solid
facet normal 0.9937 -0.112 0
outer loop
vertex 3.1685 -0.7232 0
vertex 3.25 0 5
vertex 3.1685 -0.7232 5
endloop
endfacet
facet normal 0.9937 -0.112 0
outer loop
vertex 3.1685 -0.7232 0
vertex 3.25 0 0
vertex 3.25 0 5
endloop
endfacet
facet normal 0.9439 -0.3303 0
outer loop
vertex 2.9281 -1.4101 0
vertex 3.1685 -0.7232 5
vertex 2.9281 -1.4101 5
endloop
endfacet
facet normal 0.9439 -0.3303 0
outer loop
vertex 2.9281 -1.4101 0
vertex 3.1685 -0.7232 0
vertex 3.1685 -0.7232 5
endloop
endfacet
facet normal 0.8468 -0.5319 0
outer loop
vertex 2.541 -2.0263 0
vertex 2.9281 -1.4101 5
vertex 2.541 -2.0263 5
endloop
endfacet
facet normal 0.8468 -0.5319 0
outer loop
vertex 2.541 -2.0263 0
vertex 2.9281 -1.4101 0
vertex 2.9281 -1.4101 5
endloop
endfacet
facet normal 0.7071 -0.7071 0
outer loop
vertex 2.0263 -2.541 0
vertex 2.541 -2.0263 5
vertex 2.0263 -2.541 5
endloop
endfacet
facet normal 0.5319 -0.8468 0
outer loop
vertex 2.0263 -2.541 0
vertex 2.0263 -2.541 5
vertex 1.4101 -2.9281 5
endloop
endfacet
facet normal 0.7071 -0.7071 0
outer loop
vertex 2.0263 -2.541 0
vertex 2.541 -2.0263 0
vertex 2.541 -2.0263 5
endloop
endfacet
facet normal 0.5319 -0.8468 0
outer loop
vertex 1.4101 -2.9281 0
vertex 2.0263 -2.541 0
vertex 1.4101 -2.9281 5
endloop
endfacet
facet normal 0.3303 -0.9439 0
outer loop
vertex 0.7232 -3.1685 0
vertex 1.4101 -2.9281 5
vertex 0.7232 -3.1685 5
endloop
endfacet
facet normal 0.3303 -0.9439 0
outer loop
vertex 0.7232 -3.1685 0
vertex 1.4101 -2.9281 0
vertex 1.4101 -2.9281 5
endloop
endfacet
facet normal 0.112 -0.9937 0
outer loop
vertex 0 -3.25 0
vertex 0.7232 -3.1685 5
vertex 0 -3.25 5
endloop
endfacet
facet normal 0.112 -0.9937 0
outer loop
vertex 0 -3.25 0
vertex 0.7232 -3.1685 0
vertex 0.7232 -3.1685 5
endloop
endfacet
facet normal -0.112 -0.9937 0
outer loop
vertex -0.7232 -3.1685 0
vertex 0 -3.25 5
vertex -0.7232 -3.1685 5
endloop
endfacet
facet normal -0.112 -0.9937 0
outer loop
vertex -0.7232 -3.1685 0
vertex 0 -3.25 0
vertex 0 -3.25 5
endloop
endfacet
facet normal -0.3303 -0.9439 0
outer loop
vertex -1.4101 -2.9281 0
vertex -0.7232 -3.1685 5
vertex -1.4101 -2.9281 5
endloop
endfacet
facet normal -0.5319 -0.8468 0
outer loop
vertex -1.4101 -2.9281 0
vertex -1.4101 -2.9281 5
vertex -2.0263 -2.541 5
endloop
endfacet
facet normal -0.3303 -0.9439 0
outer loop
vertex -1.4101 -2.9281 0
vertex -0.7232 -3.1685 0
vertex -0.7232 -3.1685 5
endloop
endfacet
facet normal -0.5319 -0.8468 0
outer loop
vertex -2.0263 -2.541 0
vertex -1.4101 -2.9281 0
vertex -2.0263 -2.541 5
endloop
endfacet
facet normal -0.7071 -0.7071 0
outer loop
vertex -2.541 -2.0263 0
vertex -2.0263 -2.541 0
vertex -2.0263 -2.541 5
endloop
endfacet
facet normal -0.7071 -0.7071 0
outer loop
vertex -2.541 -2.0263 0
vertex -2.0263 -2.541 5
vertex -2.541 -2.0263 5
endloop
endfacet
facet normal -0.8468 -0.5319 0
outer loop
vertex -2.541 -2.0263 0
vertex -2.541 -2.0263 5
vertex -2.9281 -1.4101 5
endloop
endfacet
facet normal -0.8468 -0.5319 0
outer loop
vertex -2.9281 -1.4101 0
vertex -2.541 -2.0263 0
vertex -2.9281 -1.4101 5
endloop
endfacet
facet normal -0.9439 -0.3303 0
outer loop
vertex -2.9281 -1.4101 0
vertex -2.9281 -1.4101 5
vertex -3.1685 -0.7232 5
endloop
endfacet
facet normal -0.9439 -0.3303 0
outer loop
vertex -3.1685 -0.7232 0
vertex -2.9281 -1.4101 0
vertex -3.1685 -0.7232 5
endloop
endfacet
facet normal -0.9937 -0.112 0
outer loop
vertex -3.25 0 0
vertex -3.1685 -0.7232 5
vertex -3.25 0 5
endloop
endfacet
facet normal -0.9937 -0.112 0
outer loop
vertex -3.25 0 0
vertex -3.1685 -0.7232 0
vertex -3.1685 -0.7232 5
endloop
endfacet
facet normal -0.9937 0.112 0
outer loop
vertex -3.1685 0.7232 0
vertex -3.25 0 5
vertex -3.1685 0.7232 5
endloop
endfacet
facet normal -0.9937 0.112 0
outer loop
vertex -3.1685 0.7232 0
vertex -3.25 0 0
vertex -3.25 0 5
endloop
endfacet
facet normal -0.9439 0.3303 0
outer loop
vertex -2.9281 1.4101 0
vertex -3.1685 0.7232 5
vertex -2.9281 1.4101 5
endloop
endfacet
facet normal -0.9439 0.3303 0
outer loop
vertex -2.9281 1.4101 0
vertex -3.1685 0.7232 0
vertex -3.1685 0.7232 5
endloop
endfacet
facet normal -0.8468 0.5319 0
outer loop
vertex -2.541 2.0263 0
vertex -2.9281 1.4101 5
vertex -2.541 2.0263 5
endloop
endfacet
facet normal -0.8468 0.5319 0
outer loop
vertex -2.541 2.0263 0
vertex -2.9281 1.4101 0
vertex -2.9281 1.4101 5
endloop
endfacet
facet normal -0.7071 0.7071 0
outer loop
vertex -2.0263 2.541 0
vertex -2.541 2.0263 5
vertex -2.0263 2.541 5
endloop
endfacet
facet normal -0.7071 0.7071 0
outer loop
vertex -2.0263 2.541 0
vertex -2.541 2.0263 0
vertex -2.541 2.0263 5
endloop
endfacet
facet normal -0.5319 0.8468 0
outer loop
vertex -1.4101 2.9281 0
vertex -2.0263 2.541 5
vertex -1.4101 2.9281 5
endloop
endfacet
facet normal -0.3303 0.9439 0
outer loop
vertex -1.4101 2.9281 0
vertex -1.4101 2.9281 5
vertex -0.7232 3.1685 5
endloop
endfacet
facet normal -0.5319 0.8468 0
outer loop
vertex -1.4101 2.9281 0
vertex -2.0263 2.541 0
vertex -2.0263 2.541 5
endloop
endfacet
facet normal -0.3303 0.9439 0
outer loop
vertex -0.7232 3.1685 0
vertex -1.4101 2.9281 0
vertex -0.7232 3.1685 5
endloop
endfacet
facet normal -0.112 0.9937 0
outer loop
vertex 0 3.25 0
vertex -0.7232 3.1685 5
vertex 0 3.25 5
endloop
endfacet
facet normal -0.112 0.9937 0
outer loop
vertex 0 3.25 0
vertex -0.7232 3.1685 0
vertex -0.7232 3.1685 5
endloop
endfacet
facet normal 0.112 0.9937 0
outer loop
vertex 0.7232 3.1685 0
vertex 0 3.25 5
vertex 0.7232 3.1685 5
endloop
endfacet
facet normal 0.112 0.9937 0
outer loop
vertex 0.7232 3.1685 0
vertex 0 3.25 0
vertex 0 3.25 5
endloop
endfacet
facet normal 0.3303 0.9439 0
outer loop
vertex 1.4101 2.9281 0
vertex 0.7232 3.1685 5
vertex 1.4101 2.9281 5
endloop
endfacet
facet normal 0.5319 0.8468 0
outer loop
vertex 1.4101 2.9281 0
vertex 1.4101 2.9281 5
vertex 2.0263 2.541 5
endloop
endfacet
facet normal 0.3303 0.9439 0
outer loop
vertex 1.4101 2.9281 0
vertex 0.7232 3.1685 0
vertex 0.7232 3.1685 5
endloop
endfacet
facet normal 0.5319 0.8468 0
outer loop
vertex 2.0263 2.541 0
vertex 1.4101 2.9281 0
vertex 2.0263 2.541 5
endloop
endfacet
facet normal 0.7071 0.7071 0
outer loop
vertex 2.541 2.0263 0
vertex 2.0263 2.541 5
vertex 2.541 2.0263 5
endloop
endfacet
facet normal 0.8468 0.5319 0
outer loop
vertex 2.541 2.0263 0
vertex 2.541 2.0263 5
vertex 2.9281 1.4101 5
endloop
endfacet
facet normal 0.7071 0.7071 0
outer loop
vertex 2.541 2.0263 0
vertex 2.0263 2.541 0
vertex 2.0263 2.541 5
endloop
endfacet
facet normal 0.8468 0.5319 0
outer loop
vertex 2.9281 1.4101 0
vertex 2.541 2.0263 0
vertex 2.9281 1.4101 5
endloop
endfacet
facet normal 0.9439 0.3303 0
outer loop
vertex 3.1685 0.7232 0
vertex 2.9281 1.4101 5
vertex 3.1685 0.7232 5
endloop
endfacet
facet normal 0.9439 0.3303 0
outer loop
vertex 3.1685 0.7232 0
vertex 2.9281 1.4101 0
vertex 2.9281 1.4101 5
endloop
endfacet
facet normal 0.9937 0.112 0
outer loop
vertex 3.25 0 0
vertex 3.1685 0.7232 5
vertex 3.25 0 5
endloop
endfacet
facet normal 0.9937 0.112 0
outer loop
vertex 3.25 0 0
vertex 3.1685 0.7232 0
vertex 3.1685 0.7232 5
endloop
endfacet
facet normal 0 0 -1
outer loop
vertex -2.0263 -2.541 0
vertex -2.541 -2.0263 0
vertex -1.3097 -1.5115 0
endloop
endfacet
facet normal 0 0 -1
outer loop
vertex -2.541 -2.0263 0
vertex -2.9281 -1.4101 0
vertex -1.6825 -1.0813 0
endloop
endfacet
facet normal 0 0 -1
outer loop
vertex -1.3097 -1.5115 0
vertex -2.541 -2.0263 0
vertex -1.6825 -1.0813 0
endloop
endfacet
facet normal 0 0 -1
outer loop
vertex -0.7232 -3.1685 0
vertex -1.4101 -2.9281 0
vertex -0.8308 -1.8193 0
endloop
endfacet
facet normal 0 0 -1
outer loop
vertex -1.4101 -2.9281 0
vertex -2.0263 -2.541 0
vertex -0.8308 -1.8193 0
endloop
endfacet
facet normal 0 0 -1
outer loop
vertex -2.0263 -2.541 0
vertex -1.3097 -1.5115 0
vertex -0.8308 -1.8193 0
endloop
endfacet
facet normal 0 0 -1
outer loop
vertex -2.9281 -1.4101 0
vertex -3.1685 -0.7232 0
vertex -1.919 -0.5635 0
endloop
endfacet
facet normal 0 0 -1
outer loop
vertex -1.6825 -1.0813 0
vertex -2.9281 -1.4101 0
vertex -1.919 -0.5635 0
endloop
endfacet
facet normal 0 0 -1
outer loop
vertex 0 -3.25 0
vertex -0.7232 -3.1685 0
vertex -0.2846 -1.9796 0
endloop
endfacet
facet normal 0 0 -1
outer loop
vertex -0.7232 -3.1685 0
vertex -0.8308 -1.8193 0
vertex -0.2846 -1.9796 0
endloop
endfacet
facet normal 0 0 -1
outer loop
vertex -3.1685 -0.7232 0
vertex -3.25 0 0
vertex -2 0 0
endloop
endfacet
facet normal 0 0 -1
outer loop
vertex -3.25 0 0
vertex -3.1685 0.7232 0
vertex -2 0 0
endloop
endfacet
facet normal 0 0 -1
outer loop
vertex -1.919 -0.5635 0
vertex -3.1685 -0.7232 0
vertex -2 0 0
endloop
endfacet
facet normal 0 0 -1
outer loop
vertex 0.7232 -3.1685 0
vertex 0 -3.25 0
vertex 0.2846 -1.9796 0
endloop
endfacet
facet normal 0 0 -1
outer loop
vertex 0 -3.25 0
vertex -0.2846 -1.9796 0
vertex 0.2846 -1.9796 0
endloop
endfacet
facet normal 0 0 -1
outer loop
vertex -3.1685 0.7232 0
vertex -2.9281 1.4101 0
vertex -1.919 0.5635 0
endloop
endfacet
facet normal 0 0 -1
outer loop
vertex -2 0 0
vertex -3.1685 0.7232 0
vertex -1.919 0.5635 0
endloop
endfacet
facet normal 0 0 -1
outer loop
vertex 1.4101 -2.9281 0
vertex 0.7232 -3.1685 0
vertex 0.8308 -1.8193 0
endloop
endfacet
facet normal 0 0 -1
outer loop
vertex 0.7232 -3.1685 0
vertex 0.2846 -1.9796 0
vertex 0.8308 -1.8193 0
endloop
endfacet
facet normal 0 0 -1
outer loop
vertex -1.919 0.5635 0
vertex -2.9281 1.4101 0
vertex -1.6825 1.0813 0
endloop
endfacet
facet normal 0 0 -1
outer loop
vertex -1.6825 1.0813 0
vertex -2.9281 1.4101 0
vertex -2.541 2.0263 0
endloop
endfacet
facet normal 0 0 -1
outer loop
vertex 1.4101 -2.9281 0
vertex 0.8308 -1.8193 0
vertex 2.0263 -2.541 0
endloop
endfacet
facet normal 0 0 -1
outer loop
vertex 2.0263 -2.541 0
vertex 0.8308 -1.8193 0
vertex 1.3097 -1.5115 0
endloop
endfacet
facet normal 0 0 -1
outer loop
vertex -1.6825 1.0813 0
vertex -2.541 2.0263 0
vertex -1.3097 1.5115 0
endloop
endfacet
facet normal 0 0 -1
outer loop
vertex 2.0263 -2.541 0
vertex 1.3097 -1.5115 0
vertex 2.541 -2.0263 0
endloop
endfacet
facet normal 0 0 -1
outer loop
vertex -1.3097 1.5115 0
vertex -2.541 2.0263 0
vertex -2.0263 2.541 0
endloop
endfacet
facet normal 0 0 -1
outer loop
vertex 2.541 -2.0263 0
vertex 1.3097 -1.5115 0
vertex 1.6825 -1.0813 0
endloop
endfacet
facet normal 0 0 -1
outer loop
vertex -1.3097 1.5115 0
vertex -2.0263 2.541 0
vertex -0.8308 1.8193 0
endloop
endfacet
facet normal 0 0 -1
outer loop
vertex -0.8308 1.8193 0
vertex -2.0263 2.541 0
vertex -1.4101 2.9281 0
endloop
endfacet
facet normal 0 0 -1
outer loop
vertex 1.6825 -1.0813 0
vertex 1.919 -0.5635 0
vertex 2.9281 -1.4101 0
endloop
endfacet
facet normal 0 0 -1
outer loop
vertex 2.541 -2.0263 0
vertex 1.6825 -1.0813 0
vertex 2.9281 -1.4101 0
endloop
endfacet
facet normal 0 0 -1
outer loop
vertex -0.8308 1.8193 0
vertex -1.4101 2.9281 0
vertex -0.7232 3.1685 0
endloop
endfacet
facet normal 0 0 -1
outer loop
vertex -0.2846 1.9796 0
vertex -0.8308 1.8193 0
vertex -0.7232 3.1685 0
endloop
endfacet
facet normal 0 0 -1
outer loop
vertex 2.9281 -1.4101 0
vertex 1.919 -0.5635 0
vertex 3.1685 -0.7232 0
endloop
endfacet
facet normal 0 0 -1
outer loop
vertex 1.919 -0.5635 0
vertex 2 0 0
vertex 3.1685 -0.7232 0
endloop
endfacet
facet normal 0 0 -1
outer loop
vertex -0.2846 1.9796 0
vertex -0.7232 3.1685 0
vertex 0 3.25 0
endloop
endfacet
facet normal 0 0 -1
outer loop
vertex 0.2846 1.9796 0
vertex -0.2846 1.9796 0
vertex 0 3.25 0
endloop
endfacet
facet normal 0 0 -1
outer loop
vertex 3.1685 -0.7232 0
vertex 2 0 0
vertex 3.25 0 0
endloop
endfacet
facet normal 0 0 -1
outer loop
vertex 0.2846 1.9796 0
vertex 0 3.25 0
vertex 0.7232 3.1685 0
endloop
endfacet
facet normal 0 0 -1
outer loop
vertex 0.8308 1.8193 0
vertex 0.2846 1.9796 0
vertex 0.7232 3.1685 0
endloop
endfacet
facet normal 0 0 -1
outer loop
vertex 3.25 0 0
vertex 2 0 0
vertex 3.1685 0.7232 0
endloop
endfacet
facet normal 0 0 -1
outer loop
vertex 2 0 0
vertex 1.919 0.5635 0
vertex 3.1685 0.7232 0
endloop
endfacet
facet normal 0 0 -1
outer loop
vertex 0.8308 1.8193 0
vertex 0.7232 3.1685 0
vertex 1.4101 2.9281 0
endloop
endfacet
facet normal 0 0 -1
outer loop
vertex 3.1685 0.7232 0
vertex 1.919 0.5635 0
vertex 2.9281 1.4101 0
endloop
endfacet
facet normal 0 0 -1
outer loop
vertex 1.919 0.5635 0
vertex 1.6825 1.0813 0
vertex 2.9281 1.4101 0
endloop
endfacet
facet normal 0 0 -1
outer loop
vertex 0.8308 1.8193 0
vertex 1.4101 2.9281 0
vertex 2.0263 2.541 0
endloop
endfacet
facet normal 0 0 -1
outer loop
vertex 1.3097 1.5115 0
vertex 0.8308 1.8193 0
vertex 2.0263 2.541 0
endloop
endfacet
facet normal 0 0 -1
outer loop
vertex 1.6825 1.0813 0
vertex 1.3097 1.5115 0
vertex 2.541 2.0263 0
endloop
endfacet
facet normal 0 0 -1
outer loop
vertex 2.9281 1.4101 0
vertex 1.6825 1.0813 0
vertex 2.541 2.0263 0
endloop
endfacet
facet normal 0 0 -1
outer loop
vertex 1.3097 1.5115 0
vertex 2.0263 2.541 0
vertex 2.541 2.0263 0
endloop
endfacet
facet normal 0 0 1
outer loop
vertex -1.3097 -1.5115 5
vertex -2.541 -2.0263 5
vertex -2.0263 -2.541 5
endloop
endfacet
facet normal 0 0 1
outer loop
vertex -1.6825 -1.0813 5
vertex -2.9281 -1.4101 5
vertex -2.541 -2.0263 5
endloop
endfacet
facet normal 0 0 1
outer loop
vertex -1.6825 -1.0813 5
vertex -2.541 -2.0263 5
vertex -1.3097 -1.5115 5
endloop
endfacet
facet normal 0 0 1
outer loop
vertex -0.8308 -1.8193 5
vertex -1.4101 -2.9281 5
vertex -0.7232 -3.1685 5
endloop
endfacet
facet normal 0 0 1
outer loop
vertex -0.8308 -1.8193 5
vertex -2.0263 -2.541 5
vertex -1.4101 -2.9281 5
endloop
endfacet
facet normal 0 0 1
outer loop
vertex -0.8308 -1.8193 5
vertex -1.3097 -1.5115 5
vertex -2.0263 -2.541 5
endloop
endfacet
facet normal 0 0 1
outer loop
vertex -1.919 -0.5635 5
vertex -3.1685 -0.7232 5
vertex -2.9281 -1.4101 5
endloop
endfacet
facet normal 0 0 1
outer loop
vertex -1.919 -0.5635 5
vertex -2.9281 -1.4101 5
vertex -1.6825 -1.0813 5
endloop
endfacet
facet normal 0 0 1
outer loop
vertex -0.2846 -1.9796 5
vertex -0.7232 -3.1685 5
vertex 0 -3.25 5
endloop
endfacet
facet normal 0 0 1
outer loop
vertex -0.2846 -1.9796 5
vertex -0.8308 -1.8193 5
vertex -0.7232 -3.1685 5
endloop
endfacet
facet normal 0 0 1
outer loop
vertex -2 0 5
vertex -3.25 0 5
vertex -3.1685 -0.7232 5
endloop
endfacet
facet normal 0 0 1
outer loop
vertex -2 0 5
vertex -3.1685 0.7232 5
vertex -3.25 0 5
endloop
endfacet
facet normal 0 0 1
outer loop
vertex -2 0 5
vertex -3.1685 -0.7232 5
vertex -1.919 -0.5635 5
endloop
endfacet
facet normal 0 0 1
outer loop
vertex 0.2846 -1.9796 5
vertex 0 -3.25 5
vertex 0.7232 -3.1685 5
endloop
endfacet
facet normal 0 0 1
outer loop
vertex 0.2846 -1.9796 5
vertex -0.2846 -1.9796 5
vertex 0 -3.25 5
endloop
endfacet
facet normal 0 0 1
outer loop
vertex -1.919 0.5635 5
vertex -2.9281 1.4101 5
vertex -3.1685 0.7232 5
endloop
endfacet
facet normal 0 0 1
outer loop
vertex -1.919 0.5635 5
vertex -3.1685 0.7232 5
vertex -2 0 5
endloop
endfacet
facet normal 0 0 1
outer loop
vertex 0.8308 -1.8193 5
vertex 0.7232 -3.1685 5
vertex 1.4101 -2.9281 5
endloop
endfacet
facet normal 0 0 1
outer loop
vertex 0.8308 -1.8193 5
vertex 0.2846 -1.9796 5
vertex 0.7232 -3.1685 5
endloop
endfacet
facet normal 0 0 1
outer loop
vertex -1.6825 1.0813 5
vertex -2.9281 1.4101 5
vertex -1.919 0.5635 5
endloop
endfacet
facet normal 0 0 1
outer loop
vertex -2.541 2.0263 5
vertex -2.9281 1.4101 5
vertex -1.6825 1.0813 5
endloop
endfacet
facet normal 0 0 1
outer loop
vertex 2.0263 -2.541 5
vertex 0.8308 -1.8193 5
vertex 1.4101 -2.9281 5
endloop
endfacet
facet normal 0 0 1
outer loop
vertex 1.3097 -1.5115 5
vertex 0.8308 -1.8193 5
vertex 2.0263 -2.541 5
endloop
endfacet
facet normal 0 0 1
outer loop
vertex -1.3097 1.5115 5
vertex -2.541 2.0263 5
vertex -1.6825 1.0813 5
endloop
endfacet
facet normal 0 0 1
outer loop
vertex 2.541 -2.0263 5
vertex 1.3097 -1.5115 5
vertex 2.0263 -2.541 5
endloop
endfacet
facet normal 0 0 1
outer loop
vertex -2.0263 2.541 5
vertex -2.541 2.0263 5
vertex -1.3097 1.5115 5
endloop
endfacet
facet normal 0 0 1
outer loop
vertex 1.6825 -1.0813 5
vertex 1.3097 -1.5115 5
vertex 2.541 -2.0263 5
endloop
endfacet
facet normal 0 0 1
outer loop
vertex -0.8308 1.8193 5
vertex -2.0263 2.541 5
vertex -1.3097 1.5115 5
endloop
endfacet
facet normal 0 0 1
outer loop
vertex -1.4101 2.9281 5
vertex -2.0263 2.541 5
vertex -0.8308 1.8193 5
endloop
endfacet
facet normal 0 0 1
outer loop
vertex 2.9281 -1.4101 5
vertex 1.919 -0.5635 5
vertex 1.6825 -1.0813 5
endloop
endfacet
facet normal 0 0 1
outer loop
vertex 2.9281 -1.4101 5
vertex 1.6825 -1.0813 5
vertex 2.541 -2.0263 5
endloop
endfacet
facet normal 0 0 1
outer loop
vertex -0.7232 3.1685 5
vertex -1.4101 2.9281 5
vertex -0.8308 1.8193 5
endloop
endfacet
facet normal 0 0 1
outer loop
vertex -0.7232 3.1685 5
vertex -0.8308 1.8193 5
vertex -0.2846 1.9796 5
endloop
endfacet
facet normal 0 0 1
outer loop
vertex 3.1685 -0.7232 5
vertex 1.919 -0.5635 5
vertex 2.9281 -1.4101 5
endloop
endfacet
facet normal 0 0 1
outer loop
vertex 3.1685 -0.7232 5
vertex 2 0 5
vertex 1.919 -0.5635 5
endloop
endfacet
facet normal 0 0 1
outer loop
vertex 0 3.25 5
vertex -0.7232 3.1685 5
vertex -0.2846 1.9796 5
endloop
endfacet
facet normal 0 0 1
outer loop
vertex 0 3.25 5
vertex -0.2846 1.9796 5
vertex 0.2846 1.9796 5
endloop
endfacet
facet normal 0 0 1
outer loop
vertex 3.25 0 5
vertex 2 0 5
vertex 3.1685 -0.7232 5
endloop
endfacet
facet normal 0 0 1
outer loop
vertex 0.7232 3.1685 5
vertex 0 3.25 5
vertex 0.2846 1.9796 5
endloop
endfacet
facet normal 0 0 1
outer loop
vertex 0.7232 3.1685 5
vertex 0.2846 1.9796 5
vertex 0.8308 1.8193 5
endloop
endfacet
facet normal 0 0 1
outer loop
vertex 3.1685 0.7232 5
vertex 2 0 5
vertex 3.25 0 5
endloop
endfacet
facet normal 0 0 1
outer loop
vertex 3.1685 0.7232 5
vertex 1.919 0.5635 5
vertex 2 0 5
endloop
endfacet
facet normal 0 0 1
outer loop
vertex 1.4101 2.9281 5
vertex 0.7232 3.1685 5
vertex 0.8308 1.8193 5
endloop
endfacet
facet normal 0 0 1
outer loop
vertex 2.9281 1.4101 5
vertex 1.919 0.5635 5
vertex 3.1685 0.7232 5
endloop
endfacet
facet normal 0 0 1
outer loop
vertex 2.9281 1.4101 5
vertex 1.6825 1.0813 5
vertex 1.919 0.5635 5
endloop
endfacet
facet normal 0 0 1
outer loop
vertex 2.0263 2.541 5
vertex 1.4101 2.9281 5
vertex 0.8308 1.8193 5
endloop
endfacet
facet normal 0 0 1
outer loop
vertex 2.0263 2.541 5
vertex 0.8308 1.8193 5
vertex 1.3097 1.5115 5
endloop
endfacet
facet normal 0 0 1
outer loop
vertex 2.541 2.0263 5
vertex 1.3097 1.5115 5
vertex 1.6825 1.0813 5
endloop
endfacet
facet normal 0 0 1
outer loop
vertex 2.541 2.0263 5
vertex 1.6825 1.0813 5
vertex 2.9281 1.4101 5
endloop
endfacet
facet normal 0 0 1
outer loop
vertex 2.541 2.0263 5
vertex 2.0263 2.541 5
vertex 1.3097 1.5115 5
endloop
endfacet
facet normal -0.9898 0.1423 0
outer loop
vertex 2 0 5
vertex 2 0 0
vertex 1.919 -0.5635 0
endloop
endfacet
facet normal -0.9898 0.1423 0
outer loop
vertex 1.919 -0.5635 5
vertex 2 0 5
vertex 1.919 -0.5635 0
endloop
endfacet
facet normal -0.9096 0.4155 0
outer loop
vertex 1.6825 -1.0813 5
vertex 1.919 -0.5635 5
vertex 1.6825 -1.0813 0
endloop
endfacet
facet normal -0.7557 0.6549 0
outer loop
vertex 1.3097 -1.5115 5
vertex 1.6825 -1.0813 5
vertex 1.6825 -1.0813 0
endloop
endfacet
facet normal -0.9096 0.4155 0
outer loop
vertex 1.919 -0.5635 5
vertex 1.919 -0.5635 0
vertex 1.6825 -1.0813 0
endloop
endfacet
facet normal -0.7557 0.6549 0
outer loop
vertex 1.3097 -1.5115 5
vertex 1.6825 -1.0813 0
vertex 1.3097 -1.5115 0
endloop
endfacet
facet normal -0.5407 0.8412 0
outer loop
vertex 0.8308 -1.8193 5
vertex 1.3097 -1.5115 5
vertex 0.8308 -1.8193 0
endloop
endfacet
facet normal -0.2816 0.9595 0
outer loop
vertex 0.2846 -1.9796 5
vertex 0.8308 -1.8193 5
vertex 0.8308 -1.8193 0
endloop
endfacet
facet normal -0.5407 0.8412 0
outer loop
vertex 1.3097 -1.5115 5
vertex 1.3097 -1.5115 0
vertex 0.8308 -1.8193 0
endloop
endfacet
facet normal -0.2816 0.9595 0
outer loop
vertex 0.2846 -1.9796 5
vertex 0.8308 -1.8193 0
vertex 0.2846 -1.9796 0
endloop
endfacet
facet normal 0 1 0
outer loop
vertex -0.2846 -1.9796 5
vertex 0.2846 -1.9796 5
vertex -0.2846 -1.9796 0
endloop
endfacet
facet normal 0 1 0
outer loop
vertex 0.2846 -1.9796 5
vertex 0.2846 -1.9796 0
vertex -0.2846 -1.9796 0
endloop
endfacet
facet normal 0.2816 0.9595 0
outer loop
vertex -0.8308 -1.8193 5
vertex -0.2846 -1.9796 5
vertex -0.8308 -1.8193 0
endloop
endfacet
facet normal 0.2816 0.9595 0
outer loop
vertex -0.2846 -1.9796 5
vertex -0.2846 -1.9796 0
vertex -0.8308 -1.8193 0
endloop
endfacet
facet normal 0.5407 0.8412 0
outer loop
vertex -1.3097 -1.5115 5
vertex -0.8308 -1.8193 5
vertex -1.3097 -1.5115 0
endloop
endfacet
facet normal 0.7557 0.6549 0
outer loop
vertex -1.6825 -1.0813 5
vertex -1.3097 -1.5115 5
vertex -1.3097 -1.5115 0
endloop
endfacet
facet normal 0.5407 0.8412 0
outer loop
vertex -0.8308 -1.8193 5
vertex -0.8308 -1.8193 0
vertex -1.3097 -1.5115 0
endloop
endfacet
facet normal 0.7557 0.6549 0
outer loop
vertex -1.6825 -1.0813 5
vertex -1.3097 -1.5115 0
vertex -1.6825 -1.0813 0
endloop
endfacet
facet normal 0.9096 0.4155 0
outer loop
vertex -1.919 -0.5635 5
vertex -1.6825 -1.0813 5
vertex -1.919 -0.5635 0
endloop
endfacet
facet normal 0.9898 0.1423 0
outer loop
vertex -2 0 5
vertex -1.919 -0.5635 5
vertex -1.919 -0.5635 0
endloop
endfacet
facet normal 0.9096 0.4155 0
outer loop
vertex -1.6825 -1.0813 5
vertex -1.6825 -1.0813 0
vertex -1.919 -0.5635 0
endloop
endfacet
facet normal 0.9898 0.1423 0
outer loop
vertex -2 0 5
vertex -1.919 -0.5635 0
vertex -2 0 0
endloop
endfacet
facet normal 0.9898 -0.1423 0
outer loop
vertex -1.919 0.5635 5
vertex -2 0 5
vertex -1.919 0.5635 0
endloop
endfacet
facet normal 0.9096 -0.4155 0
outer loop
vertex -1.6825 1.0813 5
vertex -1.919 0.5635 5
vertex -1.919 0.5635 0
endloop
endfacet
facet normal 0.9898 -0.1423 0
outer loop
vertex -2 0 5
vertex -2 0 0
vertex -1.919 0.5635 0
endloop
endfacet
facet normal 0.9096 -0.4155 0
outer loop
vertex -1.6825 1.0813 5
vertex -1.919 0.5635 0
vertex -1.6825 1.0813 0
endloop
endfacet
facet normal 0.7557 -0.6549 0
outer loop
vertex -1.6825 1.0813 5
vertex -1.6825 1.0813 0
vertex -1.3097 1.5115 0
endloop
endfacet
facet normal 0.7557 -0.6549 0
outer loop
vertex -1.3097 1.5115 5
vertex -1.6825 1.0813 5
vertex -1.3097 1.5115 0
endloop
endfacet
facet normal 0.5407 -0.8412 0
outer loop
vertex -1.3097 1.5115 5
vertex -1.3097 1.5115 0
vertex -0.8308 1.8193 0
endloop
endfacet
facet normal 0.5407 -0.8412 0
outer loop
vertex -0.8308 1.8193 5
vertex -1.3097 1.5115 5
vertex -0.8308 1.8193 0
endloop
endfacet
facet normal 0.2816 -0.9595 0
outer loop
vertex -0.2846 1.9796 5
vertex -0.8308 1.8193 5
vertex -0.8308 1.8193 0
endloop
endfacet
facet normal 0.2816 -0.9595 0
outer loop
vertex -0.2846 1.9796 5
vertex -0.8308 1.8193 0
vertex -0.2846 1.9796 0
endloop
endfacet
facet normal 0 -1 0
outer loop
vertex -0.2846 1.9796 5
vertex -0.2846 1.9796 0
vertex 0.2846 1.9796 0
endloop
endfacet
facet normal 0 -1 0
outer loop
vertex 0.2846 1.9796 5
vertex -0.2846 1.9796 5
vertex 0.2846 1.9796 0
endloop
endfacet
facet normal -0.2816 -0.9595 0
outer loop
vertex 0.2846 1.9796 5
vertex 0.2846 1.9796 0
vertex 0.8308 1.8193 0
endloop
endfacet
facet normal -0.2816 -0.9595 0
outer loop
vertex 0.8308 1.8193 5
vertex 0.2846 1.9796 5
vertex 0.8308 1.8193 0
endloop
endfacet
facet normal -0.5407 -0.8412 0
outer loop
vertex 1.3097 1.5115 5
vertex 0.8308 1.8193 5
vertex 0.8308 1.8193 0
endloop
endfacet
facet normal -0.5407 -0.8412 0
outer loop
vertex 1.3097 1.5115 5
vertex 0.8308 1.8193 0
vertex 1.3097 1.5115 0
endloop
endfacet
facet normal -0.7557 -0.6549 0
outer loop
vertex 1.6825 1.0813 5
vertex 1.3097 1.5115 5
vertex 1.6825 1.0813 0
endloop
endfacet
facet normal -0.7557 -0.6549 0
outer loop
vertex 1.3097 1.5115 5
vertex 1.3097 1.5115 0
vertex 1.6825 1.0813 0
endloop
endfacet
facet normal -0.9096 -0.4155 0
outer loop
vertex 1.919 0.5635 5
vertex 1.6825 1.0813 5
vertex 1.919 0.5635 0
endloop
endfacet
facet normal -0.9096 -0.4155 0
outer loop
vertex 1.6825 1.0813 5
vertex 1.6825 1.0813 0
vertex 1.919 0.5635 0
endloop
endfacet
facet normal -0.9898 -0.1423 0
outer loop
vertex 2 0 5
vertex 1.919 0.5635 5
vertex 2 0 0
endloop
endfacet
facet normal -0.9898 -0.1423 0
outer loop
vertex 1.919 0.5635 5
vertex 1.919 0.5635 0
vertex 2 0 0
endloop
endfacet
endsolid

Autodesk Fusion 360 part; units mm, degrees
sketch "Sketch1" plane through (0, 0, 0) normal (0, 0, 1) x (1, 0, 0)
  circle A0 centre (0, 0) radius 2
  circle A1 centre (0, 0) radius 2.75
  dimension "d5" = 4
  dimension "d8" = 5.5
extrude "Extrude2" add sketch "Sketch1" along normal blind 6.6
move_face "OffsetFaces1" offset 0.5 1 faces at (2.7466, -0.1371, 4.4)
extrude "Extrude3" cut 1 faces at (2.8212, 0.1615, 6.6) along direction (0, 0, -1) blind 1.6
